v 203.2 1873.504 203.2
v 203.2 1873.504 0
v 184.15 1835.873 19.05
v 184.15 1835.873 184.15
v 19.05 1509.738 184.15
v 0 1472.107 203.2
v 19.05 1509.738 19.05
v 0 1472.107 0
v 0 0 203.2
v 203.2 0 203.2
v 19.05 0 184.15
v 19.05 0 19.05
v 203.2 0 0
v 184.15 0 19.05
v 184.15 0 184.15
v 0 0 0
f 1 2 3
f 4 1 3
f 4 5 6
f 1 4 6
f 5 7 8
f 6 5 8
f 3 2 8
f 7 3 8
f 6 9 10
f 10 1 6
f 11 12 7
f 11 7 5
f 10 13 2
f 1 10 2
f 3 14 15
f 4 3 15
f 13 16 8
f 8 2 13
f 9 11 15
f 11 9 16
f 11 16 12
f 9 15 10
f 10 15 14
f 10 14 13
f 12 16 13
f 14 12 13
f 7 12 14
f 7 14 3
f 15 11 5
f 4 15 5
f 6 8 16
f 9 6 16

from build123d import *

# Parameters (mm, degrees)
BOSS_EXTRUDE1_DEPTH     = 203.2
SKETCH2_W               = 165.1
SKETCH2_H               = 165.1
CUT_EXTRUDE1_DEPTH      = 1
CUT_EXTRUDE1_DEPTH_BACK = 1874.504


with BuildPart() as part:
    # Sketch1 → Boss-Extrude1 (new body)
    with BuildSketch(Plane.XY):
        Polygon((0, 0), (203.2, 0), (203.2, 1873.504), (0, 1472.107144898), align=None)
    extrude(amount=BOSS_EXTRUDE1_DEPTH)

    # Sketch2 → Cut-Extrude1 (cut, two sides)
    with BuildSketch(Plane.XZ) as cut_extrude1_sk:
        with Locations((101.6, 101.6)):
            Rectangle(SKETCH2_W, SKETCH2_H)
    extrude(amount=CUT_EXTRUDE1_DEPTH, mode=Mode.SUBTRACT)
    extrude(cut_extrude1_sk.sketch, amount=-CUT_EXTRUDE1_DEPTH_BACK, mode=Mode.SUBTRACT)


solid = part.part
